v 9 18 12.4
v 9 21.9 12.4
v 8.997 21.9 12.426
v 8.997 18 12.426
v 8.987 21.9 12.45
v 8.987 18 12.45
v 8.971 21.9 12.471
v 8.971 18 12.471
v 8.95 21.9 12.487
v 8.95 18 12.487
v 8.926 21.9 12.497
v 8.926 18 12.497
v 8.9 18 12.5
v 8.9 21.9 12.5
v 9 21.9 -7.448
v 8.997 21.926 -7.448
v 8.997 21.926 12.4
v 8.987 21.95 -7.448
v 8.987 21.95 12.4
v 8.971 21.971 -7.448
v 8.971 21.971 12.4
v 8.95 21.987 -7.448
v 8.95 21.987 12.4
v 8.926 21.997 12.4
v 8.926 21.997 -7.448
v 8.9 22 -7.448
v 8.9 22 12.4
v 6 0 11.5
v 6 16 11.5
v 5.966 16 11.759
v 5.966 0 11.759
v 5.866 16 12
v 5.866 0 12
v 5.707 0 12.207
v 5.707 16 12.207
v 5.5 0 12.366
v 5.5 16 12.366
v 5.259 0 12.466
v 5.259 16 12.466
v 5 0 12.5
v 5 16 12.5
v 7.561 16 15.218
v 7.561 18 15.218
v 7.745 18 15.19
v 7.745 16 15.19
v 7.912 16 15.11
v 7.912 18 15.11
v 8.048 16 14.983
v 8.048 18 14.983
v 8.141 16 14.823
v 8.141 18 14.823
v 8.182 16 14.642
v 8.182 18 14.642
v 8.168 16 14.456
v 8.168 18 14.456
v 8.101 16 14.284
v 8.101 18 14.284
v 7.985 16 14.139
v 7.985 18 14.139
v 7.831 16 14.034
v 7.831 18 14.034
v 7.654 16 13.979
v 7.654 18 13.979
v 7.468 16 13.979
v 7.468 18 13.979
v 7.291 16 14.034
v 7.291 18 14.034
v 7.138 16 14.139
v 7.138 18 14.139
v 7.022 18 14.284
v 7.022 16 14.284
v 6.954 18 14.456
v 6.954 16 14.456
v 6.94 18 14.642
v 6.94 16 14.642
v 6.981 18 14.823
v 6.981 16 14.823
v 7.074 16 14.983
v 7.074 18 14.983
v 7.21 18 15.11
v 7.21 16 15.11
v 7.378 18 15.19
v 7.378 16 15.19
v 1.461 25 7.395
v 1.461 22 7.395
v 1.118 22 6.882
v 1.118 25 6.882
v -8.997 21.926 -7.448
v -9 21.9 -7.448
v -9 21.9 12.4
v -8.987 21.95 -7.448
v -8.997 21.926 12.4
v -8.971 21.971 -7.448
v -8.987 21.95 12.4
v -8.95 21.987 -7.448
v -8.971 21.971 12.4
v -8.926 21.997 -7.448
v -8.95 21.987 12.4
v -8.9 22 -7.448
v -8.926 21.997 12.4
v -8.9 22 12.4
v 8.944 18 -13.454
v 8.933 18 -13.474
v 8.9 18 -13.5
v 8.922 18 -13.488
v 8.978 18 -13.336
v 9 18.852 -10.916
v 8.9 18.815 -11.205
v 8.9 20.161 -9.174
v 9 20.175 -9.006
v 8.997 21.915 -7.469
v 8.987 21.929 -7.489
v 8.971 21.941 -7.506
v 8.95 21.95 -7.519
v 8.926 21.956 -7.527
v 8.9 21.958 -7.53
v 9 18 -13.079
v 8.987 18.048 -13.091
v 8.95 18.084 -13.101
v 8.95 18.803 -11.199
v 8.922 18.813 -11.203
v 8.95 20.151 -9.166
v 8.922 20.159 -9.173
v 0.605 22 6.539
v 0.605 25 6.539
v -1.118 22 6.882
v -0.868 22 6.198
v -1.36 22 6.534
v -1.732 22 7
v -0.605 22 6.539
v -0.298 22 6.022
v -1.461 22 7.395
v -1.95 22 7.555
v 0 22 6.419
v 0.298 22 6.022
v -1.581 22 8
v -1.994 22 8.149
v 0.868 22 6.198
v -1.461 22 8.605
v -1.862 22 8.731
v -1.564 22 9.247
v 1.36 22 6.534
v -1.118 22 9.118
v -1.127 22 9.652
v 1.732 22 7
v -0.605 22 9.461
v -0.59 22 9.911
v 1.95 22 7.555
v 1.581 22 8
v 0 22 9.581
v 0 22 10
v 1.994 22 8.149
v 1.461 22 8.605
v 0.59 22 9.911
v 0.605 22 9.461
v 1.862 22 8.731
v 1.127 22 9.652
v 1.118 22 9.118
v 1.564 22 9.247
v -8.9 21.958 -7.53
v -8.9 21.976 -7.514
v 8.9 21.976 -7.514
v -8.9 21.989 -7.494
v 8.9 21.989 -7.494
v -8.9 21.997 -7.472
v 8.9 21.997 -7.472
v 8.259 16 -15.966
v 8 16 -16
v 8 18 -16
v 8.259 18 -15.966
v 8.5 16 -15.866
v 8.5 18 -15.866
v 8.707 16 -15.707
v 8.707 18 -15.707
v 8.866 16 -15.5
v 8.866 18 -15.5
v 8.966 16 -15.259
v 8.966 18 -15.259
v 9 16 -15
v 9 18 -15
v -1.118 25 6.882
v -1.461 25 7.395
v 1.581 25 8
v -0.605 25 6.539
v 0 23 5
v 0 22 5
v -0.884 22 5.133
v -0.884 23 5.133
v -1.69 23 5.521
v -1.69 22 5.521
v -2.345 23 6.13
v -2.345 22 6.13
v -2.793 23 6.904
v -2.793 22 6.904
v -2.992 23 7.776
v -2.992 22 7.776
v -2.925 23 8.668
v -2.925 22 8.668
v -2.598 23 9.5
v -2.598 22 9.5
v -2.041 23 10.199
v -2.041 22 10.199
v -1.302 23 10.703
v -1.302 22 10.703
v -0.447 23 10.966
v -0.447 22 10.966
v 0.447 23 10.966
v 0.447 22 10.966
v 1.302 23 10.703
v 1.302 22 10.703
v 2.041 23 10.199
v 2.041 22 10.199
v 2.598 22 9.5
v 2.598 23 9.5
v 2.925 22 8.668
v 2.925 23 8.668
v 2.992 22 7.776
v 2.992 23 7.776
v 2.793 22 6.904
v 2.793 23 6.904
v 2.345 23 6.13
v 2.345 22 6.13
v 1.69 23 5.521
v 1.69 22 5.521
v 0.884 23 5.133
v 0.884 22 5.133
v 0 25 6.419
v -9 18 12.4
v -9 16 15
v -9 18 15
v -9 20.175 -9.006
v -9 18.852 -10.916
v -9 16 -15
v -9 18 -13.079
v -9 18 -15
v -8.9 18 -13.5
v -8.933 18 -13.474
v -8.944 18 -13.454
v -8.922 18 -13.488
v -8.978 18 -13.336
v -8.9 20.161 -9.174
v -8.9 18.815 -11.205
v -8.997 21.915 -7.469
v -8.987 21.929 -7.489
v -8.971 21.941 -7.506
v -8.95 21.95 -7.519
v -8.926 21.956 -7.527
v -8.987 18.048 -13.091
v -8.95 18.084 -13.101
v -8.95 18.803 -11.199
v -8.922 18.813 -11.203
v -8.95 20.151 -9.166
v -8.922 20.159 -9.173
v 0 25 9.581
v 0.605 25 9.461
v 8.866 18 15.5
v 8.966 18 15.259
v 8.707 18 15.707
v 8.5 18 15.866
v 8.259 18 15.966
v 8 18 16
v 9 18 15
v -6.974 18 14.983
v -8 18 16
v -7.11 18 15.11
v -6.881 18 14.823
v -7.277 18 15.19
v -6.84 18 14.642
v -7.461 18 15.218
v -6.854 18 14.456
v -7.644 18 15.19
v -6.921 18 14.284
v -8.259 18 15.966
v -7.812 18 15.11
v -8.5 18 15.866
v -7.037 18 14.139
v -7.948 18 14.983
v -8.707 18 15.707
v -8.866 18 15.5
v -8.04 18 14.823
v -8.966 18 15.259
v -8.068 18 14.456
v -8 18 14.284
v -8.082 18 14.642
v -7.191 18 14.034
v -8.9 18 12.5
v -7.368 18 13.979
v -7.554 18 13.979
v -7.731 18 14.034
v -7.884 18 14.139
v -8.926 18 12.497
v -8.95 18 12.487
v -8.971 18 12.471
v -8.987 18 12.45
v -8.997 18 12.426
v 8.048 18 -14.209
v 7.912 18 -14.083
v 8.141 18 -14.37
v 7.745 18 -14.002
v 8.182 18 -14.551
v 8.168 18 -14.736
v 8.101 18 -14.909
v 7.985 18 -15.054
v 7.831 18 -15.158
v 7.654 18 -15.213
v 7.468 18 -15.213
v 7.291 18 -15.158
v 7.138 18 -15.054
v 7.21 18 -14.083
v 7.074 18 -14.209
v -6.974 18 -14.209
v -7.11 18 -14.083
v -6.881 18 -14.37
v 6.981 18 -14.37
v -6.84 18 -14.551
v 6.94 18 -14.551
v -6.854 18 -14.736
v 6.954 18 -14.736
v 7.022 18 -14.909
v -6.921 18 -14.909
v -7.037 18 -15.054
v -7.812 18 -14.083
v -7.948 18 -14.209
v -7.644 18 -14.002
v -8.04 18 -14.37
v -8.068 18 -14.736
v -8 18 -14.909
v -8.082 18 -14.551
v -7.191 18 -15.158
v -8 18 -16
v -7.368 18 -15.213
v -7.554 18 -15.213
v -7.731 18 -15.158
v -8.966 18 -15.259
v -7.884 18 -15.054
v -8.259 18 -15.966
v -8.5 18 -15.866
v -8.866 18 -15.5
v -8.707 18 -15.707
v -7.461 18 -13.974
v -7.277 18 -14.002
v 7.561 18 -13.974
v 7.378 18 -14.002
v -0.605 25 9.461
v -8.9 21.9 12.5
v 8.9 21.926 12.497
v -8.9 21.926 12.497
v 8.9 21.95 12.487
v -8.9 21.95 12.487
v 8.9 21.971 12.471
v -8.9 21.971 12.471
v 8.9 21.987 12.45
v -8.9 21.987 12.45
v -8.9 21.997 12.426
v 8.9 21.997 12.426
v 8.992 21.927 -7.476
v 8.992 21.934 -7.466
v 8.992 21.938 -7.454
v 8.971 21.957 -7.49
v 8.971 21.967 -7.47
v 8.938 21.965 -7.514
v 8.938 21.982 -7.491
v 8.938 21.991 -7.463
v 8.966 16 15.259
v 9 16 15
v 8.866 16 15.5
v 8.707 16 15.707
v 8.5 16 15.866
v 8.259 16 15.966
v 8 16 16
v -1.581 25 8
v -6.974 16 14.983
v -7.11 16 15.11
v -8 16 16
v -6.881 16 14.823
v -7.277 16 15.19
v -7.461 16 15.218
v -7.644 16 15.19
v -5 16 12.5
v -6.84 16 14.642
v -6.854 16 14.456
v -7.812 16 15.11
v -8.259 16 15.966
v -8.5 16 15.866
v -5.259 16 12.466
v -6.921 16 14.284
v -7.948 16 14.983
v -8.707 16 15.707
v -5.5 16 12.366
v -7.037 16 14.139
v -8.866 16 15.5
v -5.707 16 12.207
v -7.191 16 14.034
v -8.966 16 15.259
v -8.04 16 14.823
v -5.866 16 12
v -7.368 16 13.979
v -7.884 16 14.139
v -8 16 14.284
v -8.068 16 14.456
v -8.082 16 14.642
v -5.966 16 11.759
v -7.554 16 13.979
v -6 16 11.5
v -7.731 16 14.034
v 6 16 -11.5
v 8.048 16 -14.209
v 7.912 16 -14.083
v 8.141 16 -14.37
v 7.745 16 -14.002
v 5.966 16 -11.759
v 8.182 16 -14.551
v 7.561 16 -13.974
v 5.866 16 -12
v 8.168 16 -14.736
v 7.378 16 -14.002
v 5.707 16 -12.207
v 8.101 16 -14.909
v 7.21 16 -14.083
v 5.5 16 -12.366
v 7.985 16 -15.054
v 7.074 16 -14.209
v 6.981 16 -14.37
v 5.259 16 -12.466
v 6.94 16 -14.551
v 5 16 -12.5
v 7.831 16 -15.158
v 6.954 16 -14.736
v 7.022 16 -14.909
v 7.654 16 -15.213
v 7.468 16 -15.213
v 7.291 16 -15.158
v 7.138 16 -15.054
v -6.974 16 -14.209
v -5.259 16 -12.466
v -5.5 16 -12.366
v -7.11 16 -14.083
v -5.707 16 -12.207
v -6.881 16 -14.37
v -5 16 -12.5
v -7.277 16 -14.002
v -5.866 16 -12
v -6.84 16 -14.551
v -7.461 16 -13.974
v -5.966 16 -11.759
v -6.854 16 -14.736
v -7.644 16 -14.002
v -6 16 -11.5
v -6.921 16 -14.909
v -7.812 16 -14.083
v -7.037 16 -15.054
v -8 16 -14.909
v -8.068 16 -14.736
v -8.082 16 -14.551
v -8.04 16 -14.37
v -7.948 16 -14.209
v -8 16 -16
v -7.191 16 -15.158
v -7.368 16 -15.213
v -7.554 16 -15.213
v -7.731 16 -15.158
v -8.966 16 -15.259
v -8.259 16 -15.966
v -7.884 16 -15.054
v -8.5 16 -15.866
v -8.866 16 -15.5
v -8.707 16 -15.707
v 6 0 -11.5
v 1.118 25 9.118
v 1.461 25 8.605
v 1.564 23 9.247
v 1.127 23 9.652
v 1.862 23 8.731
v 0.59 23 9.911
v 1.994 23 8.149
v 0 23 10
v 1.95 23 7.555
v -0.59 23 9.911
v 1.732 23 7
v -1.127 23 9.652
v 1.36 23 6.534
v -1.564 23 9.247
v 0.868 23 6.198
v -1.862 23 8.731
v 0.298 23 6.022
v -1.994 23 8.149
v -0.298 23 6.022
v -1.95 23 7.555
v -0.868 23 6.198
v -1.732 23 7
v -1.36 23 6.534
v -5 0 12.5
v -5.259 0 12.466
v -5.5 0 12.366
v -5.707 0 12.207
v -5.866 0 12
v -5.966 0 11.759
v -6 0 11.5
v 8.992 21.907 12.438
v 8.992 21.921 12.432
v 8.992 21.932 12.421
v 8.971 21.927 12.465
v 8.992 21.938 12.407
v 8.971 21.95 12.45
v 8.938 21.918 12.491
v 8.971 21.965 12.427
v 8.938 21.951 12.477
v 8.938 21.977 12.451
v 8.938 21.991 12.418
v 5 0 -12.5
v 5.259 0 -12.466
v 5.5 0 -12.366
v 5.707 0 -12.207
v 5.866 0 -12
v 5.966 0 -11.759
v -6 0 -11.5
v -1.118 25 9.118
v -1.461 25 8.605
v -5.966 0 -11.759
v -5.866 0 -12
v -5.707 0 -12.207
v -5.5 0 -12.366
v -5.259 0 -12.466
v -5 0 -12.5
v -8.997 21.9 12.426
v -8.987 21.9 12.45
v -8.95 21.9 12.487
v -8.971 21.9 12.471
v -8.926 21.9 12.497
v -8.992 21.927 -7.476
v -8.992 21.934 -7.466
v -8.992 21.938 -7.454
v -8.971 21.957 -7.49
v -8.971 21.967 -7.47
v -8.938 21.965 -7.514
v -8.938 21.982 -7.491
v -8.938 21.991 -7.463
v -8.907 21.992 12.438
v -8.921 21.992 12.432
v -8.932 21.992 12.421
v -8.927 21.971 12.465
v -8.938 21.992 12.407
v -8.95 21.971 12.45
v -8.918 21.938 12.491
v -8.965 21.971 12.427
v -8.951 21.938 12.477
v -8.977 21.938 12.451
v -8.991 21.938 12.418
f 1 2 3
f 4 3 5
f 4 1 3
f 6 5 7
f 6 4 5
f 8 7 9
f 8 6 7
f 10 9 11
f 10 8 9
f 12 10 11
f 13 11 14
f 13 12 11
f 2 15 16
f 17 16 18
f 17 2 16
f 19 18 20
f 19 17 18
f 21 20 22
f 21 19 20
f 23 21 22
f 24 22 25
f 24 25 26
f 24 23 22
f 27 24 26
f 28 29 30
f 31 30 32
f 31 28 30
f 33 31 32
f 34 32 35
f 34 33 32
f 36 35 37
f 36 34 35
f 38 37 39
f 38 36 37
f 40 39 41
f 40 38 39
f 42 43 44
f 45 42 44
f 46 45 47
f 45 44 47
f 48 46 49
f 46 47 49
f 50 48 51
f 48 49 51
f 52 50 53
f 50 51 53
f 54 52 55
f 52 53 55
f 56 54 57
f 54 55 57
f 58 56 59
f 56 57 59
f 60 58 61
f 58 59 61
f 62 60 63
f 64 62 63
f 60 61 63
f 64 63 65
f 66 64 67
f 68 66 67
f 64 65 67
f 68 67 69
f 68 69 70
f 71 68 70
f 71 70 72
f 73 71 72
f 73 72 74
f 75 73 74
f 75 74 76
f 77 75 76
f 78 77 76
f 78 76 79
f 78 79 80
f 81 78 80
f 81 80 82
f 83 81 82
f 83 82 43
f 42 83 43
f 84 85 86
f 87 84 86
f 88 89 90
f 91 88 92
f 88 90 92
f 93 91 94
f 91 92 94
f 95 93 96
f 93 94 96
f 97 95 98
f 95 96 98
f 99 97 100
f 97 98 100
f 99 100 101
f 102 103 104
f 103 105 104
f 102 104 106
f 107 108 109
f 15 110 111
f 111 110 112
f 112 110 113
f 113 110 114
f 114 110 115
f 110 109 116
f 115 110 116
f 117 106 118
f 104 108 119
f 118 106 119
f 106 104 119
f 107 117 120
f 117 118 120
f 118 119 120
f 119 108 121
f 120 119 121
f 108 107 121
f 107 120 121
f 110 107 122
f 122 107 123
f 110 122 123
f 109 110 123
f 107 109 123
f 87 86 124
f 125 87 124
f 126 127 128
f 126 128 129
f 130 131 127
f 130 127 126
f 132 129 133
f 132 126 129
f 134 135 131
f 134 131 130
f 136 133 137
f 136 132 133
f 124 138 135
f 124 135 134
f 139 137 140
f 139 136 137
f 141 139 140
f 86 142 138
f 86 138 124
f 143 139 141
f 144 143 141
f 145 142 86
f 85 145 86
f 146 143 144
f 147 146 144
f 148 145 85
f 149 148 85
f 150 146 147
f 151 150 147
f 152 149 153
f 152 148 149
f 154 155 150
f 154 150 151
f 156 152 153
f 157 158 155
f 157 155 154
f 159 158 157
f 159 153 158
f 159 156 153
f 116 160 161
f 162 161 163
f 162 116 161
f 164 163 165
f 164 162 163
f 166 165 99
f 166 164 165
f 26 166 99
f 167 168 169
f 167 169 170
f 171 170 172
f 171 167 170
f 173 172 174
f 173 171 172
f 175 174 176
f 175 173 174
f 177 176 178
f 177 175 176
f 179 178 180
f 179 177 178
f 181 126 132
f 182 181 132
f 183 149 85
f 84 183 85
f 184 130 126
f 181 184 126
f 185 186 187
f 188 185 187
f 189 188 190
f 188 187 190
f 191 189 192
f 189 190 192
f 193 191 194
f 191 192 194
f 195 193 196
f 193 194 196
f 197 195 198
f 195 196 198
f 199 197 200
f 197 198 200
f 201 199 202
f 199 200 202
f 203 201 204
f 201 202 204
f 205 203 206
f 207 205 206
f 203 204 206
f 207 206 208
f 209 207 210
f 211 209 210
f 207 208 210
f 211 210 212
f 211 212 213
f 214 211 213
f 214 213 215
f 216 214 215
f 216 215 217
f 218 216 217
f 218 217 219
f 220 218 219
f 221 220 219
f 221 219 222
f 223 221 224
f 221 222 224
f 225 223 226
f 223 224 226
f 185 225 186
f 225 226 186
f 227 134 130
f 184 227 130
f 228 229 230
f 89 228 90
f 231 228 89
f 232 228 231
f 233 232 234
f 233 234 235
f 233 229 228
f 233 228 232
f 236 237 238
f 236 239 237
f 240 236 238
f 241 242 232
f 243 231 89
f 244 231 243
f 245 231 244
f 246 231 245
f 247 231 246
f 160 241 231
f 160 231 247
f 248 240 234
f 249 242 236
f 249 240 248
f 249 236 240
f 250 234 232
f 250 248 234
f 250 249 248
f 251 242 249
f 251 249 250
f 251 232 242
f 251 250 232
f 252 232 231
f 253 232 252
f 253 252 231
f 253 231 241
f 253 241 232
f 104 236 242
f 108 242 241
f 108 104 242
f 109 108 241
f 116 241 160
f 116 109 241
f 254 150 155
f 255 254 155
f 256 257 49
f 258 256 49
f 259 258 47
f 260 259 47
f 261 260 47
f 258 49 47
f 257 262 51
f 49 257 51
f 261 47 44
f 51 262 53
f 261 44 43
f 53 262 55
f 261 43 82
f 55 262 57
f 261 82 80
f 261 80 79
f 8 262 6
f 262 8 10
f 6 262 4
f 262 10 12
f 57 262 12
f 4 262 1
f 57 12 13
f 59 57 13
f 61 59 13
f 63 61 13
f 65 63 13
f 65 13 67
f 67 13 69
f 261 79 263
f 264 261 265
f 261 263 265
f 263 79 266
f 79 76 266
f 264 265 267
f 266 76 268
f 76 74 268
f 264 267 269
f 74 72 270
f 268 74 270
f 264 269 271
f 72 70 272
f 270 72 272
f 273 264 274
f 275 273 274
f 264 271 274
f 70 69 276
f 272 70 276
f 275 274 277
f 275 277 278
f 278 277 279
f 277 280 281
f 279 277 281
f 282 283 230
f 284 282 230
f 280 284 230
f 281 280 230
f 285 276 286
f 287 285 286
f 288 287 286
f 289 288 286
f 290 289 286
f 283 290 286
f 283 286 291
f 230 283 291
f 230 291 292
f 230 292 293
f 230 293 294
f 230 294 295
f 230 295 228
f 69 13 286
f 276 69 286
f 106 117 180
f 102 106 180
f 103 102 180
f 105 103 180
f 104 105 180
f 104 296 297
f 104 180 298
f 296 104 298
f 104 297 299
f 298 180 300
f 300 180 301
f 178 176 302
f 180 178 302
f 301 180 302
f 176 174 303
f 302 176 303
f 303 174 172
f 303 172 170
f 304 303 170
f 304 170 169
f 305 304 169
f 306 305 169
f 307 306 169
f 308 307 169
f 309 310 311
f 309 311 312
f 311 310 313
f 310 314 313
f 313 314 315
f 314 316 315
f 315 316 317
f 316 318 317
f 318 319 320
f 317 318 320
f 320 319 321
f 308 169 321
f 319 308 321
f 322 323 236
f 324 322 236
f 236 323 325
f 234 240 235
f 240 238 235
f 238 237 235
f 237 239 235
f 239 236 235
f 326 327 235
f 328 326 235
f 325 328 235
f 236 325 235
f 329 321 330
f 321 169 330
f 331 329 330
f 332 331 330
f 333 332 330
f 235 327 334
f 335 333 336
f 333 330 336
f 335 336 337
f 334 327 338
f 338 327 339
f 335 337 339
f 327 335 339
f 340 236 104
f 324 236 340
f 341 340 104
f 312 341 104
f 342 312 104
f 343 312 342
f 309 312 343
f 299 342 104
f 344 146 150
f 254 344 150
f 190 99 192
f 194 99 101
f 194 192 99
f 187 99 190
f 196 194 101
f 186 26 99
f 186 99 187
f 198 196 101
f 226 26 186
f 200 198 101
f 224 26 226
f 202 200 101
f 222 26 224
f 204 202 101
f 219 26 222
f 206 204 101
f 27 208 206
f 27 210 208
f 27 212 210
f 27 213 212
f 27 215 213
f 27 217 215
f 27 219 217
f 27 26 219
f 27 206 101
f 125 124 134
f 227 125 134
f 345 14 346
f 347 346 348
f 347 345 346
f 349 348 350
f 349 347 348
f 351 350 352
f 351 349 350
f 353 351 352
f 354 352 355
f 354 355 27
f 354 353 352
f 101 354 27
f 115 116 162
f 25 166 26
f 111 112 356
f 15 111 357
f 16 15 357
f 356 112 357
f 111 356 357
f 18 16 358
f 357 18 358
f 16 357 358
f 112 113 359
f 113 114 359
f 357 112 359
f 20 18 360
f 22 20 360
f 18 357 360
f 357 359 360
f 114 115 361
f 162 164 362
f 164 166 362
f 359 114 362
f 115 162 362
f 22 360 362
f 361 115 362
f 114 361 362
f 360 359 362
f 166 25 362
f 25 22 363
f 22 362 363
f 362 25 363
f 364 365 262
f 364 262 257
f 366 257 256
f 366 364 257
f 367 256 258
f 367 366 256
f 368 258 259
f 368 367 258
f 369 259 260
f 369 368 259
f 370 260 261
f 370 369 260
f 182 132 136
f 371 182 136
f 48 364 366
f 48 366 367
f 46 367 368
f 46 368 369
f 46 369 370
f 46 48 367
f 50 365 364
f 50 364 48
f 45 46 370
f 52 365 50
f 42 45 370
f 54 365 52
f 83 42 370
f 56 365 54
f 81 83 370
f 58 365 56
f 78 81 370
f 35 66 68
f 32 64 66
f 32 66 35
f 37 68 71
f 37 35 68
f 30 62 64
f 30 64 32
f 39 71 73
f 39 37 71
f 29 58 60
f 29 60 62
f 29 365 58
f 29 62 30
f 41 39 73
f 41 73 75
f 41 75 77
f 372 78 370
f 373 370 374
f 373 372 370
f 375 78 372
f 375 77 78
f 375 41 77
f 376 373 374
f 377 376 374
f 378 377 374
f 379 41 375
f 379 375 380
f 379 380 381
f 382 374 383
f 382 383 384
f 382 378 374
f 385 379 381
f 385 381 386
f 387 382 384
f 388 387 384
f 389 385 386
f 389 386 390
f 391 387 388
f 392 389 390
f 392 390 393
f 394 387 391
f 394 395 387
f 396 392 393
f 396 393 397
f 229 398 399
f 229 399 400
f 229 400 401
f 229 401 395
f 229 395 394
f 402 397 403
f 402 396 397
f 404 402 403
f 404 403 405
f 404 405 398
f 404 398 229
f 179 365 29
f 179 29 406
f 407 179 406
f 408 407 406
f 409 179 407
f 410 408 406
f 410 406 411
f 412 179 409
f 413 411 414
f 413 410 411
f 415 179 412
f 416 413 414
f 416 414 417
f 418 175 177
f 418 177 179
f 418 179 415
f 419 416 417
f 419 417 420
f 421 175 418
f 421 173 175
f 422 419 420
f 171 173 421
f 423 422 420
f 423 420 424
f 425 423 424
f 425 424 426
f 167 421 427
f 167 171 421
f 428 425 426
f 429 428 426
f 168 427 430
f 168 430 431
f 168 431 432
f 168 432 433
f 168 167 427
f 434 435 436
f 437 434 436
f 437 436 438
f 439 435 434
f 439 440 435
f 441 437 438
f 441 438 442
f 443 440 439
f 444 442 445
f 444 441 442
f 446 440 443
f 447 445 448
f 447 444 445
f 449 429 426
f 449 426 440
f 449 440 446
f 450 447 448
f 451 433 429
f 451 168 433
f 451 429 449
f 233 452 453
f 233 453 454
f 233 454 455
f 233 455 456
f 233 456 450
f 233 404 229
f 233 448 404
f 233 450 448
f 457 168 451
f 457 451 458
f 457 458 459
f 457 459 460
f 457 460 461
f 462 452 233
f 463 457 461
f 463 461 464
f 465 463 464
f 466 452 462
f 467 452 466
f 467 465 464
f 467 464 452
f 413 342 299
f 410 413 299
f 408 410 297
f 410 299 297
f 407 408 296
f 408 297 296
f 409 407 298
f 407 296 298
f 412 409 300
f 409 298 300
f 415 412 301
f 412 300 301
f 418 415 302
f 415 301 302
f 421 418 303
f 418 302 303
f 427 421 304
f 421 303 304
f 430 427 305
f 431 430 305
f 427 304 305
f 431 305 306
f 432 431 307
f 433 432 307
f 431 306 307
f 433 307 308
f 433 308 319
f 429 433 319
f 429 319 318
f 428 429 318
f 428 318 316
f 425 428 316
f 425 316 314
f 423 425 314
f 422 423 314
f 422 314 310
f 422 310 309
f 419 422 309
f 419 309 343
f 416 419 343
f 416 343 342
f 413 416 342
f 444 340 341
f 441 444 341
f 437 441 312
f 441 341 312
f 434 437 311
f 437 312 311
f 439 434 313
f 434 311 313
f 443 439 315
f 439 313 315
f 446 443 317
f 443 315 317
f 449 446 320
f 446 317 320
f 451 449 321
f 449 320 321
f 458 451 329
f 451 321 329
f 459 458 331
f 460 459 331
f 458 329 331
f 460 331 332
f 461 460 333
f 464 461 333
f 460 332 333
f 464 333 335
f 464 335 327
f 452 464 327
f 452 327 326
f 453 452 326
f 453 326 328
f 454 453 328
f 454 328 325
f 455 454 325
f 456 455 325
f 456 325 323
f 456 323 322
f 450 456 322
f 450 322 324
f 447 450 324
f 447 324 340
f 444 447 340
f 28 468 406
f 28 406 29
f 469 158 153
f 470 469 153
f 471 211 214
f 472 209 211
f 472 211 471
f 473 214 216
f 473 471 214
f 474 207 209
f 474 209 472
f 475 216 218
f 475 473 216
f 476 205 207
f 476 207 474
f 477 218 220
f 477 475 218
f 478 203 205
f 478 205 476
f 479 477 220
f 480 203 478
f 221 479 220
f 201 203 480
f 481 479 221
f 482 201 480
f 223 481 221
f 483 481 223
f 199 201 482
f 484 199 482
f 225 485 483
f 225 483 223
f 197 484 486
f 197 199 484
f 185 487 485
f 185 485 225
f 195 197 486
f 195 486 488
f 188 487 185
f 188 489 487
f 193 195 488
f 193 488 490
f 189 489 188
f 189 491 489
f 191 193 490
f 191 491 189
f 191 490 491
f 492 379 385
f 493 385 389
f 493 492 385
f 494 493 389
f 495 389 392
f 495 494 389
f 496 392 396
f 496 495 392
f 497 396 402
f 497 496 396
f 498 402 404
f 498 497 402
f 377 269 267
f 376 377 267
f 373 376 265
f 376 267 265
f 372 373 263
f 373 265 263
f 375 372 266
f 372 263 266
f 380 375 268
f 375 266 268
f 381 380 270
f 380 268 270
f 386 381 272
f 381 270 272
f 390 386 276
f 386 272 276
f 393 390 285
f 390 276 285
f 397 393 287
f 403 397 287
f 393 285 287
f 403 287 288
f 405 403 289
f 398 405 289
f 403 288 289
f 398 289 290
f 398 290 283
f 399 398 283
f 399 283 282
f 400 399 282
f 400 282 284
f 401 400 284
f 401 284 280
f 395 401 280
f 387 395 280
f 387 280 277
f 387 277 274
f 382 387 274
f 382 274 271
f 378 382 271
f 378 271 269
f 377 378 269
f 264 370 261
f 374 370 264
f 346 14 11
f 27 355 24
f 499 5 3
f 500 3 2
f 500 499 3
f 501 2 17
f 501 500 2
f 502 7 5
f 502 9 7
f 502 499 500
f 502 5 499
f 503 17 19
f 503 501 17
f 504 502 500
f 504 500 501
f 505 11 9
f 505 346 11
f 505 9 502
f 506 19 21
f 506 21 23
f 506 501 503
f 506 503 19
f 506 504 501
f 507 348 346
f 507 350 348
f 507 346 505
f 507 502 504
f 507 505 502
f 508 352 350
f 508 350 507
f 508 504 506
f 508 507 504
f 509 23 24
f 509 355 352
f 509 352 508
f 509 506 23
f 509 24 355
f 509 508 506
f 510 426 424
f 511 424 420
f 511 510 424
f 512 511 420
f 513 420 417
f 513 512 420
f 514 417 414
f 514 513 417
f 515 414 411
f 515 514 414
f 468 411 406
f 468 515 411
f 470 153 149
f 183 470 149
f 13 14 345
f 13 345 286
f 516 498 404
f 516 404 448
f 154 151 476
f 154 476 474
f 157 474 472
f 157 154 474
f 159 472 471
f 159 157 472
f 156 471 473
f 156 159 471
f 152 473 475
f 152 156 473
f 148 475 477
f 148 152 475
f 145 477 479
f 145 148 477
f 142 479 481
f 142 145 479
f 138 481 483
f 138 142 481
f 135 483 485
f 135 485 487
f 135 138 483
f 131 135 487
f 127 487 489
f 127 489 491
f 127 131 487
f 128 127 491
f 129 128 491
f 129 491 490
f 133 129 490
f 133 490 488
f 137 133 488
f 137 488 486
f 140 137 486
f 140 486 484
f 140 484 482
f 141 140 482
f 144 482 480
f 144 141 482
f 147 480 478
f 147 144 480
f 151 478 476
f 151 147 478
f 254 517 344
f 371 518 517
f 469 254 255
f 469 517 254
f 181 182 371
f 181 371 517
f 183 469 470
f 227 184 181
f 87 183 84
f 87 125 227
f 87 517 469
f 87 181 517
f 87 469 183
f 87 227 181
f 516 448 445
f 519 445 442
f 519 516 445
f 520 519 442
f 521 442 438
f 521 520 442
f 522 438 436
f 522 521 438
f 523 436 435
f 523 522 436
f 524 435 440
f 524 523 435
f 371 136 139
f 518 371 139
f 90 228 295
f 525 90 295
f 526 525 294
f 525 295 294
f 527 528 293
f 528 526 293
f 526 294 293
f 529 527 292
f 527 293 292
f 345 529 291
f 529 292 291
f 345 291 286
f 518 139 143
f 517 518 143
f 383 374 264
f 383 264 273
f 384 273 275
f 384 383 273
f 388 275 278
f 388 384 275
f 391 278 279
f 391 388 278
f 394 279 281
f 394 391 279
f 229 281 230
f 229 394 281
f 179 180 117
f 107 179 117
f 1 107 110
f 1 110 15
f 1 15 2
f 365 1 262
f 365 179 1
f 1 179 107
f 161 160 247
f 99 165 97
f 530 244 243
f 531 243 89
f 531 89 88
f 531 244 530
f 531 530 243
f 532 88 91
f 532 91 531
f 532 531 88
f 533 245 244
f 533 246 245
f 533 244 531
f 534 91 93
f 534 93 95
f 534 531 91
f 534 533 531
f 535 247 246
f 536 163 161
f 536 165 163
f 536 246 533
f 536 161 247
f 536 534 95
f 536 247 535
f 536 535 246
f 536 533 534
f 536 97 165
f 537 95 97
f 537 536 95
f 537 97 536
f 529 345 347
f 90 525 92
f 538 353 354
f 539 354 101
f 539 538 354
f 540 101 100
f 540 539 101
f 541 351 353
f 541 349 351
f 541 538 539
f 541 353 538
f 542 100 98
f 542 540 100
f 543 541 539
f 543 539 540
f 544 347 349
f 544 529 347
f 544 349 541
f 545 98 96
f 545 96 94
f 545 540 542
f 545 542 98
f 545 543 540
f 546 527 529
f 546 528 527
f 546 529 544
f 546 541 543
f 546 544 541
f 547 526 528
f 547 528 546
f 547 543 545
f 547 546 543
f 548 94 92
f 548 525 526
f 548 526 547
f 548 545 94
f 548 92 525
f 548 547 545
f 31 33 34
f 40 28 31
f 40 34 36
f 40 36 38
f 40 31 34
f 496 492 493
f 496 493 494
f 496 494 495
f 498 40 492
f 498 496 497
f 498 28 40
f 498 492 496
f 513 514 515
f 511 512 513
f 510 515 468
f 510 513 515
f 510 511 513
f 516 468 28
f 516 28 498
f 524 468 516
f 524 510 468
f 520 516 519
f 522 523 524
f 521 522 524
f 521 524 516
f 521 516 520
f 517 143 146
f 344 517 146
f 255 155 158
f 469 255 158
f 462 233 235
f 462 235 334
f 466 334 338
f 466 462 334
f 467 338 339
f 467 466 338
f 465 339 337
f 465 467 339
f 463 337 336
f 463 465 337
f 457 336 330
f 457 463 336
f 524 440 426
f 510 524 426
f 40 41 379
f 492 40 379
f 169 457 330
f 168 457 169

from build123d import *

# Parameters (mm, degrees)
BOSS_EXTRUDE1_DEPTH = 16
BOSS_EXTRUDE2_DEPTH = 2
BOSS_EXTRUDE3_DEPTH = 9
SKETCH5_R           = 0.622765991
CUT_EXTRUDE1_DEPTH  = 18
FILLET1_R           = 0.1
SKETCH6_R           = 3
SKETCH6_R_2         = 2
BOSS_EXTRUDE4_DEPTH = 1
BOSS_EXTRUDE5_DEPTH = 3


with BuildPart() as part:
    # Sketch1 → Boss-Extrude1 (new body)
    with BuildSketch(Plane(origin=(0, 0, 0), x_dir=(1, 0, 0), z_dir=(0, 1, 0))):
        with BuildLine():
            Line((-5, 12.5), (5, 12.5))
            ThreePointArc((5, 12.5), (5.707106781, 12.207106781), (6, 11.5))
            Line((6, 11.5), (6, -11.5))
            ThreePointArc((6, -11.5), (5.707106781, -12.207106781), (5, -12.5))
            Line((5, -12.5), (-5, -12.5))
            ThreePointArc((-5, -12.5), (-5.707106781, -12.207106781), (-6, -11.5))
            Line((-6, -11.5), (-6, 11.5))
            ThreePointArc((-6, 11.5), (-5.707106781, 12.207106781), (-5, 12.5))
        make_face()
    extrude(amount=BOSS_EXTRUDE1_DEPTH)

    # Sketch2 → Boss-Extrude2 (add)
    with BuildSketch(Plane(origin=(0, 16, 0), x_dir=(1, 0, 0), z_dir=(0, 1, 0))):
        with BuildLine():
            Line((-8, 16), (8, 16))
            ThreePointArc((8, 16), (8.707106781, 15.707106781), (9, 15))
            Line((9, 15), (9, -15))
            ThreePointArc((9, -15), (8.707106781, -15.707106781), (8, -16))
            Line((8, -16), (-8, -16))
            ThreePointArc((-8, -16), (-8.707106781, -15.707106781), (-9, -15))
            Line((-9, -15), (-9, 15))
            ThreePointArc((-9, 15), (-8.707106781, 15.707106781), (-8, 16))
        make_face()
    extrude(amount=BOSS_EXTRUDE2_DEPTH)

    # Sketch4 → Boss-Extrude3 (add, symmetric)
    with BuildSketch(Plane(origin=(0, 0, 0), x_dir=(0, 0, -1), z_dir=(1, 0, 0))):
        with BuildLine():
            Line((-12.5, 18), (13.5, 18))
            ThreePointArc((13.5, 18), (10.126897029, 19.440345543), (7.5, 22))
            Line((7.5, 22), (-12.5, 22))
            Line((-12.5, 22), (-12.5, 18))
        make_face()
    extrude(amount=BOSS_EXTRUDE3_DEPTH, both=True)

    # Sketch5 → Cut-Extrude1 (cut)
    with BuildSketch(Plane(origin=(0, 18, 0), x_dir=(1, 0, 0), z_dir=(0, 1, 0))):
        with Locations(Location((-7.460775455, -14.595038574, 0), (0, 0, 270))):
            Circle(SKETCH5_R)
        with Locations(Location((7.561200473, -14.595038574, 0), (0, 0, 270))):
            Circle(SKETCH5_R)
        with Locations(Location((-7.460775455, 14.59721935, 0), (0, 0, 270))):
            Circle(SKETCH5_R)
        with Locations(Location((7.561200473, 14.59721935, 0), (0, 0, 270))):
            Circle(SKETCH5_R)
    extrude(amount=-CUT_EXTRUDE1_DEPTH, mode=Mode.SUBTRACT)

    # Fillet1
    fillet1_edges = [part.edges().sort_by_distance(p)[0] for p in [
        (-9, 20, 12.5),
        (0, 22, 12.5),
        (-9, 19.440345543, -10.126897029),
        (-9, 22, 2.5),
        (0, 22, -7.5),
        (9, 20, 12.5),
        (9, 19.440345543, -10.126897029),
        (9, 22, 2.5),
    ]]
    fillet(fillet1_edges, radius=FILLET1_R)

    # Sketch6 → Boss-Extrude4 (add)
    with BuildSketch(Plane(origin=(0, 22, 0), x_dir=(1, 0, 0), z_dir=(0, 1, 0))):
        with Locations(Location((0, -8, 0), (0, 0, 90))):
            Circle(SKETCH6_R)
        with Locations(Location((0, -8, 0), (0, 0, 270))):
            Circle(SKETCH6_R_2, mode=Mode.SUBTRACT)
    extrude(amount=BOSS_EXTRUDE4_DEPTH)

    # Sketch7 → Boss-Extrude5 (add)
    with BuildSketch(Plane(origin=(0, 22, 0), x_dir=(1, 0, 0), z_dir=(0, 1, 0))):
        Polygon((-1.117847018, -6.882152982), (-1.460537515, -7.395025553), (-1.580874414, -8), (-1.460537515, -8.604974447), (-1.117847018, -9.117847018), (-0.604974447, -9.460537515), (0, -9.580874414), (0.604974447, -9.460537515), (1.117847018, -9.117847018), (1.460537515, -8.604974447), (1.580874414, -8), (1.460537515, -7.395025553), (1.117847018, -6.882152982), (0.604974447, -6.539462485), (0, -6.419125586), (-0.604974447, -6.539462485), align=None)
    extrude(amount=BOSS_EXTRUDE5_DEPTH)


solid = part.part
